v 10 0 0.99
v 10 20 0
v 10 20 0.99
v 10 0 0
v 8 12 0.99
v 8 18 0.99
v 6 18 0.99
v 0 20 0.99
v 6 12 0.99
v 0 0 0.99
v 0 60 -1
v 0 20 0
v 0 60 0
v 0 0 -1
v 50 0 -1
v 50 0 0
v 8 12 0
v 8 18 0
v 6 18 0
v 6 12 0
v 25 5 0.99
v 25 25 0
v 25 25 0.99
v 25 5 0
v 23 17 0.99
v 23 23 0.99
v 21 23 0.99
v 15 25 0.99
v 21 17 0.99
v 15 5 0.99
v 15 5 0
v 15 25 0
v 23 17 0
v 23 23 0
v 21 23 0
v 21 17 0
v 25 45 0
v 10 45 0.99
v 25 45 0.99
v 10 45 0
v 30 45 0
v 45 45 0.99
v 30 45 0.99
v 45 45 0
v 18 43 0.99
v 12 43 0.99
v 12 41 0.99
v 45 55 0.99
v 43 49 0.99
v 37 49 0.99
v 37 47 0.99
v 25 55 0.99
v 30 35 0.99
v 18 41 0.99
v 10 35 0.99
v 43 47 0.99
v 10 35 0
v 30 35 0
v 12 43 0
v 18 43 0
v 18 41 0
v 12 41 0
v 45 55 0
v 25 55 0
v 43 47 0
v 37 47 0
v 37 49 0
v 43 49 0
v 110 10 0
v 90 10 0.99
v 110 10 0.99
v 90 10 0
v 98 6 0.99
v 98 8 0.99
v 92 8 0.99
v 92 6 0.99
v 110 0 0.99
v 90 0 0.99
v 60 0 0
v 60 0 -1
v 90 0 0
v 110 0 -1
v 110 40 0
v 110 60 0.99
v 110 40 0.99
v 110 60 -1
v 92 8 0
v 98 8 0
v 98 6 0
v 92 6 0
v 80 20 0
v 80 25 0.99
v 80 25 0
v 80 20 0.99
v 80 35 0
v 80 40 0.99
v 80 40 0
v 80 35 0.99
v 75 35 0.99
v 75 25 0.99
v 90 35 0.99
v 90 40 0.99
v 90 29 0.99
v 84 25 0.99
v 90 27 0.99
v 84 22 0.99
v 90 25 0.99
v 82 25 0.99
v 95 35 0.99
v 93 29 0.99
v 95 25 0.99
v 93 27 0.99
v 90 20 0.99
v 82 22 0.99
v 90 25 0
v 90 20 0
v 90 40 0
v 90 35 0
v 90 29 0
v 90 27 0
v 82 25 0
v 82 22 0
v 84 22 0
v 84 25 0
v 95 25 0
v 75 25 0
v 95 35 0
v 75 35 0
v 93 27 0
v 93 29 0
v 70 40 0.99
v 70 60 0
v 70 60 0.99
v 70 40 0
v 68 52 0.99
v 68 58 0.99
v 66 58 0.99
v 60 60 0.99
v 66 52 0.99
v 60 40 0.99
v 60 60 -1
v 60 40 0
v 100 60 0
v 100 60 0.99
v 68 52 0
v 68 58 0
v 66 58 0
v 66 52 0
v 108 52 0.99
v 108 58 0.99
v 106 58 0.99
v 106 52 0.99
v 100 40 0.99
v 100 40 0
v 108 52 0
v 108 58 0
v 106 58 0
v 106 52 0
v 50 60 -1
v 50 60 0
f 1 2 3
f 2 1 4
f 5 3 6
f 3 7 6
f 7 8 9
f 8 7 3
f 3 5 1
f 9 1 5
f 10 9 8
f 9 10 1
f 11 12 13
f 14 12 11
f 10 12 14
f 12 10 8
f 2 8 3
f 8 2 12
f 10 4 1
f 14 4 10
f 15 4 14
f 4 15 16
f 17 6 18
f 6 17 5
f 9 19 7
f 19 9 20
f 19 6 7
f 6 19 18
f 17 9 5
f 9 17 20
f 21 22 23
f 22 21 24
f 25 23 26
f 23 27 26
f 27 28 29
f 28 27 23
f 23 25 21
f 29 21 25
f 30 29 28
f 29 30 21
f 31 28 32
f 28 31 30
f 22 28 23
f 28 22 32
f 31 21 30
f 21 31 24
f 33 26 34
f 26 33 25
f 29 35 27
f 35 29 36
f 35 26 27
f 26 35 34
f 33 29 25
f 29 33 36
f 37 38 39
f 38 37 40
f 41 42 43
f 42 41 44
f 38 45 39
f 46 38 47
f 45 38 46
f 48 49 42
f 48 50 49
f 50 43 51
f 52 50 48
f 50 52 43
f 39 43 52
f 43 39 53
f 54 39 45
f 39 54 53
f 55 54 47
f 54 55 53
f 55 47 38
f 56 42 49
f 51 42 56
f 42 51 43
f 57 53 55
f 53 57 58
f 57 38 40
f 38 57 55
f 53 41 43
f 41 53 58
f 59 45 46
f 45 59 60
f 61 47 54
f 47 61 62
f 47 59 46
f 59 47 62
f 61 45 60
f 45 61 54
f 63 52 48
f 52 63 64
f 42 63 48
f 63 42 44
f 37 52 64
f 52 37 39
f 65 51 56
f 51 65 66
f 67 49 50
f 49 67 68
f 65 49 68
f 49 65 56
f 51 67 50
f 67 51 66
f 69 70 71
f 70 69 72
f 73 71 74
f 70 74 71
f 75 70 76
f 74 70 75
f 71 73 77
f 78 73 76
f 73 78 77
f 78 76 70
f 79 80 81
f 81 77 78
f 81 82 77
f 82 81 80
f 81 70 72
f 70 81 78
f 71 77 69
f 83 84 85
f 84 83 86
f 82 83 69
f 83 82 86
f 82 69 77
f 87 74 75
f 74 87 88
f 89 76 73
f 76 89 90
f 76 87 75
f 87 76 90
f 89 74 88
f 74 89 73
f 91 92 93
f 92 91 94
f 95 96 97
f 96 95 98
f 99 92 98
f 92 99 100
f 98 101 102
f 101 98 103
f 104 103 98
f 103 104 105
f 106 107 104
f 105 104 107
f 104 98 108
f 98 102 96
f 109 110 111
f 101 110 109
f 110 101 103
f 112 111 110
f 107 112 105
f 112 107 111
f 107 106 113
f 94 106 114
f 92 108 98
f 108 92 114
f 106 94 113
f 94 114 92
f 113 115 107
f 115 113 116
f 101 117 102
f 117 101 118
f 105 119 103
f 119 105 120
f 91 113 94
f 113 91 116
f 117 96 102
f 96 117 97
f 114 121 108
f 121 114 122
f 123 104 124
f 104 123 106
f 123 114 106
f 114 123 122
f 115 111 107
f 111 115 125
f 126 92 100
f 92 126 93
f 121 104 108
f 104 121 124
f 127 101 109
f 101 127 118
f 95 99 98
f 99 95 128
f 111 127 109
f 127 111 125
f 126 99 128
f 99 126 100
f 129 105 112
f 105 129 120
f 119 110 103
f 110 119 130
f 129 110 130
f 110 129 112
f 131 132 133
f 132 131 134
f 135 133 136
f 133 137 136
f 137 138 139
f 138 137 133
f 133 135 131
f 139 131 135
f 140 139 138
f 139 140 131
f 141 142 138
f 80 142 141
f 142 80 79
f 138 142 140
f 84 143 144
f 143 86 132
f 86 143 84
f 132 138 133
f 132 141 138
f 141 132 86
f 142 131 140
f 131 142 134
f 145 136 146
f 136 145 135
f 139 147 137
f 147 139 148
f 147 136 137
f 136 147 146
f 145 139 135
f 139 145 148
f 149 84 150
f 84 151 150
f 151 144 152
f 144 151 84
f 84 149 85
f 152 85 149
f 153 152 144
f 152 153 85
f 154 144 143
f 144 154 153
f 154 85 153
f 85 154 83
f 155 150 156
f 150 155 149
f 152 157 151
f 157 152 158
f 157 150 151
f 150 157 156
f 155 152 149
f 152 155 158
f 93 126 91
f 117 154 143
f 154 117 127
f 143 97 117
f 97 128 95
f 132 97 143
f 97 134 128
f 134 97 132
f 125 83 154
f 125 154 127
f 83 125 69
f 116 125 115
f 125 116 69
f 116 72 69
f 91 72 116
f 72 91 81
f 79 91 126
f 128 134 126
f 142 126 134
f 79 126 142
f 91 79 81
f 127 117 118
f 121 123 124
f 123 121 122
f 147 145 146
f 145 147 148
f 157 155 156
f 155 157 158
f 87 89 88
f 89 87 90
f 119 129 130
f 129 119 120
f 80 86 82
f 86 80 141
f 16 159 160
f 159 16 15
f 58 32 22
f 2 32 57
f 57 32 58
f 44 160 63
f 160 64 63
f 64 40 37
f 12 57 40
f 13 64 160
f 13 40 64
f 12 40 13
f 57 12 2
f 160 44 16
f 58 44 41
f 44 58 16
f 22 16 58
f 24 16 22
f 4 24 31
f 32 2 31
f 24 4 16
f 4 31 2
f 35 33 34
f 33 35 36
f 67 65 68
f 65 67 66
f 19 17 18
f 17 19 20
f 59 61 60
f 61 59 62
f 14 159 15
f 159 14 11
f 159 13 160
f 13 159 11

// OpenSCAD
// file: ../../Base/Boxes.scad
// Fischertechnik Box Foundation
// Pre-designed Boxes

use <Constants.scad>

include <PlacementOptions.scad>

box190Width = 190;
box190Depth = 130;
box130Width = 130;
box130Depth = 95;
boxUsageHeight = 33.9;
boxWallThickness = 2.4;
boxBaseThickness = 1.0;

// getBoxWallThickness()
// Gets the wall thickness of a Fischertechnik Box

function getBoxWallThickness() = boxWallThickness;

// Gets the usable height of a fischertechnik box
function getBoxUsageHeight() = boxUsageHeight;

// Gets the thickness of the Fischertechnik box base.
function getBoxBaseThickness() = boxBaseThickness;

// Gets the usable inner space of a Box 190 as an x/y-list
function getBox190Space() = [
    box190Width - 2*getBoxWallThickness(), 
    box190Depth - 2*getBoxWallThickness() ];

// Imports the Fischertechnik empty box 130x190 mm and places it at position 0,0
// 190x130 are the outer sizes, the inner space is slightly smaller. Use getBox190Space() to get the inner sizes.
// This module needs the STL file "Fischertechnik Box 130x190.stl" in the library path.
// The box is positioned that the usable inner space is at the 0,0,0 position. The

module Box190() {
    translate([-getBoxWallThickness(),-getBoxWallThickness(),-getBoxBaseThickness()])
        import("Fischertechnik Box 130x190.stl", convexity=3);
}

// Gets the usable inner space of a Box 130 as an x/y-list
function getBox130Space() = [
    box130Width - 2*getBoxWallThickness(), 
    box130Depth - 2*getBoxWallThickness() ];

// Imports the Fischertechnik empty box 95x130 mm and places it at position 0,0
// 190x130 are the outer sizes, the inner space is slightly smaller. Use getBox190Space() to get the inner sizes.
// This module needs the STL file "Fischertechnik Box 95x130.stl" in the library path.
// The box is positioned that the usable inner space is at the 0,0,0 position. The

module Box130() {
    translate([-getBoxWallThickness(),-getBoxWallThickness(),-getBoxBaseThickness()])
        import("Fischertechnik Box 95x130.stl", convexity=3);
}

// Creates a web at the specified box walls
// corner 0 = LowerLeft, 1 = UpperLeft, 2 = UpperRight, 3 = LowerRight
// side 0 = LeftOfCorner, 1 = RightOfCorner
// distance = Distance in mm from the corner
// box = inner width and depth of the box (default: Box 190)
// webWidth = length of the web (default is 3 mms)
// webThickness = thickness of the web (default is 1 mm)

module BoxWeb(corner, side, distance, box=getBox190Space(), webWidth=3, webThickness=1.0) {
    sink = getBoxWallThickness()/2;

    width = (corner % 2 == 0) ? 
            (side == LeftOfCorner ? webWidth : webThickness) :
            (side == LeftOfCorner ? webThickness : webWidth);

    depth = (corner % 2 == 0) ? 
            (side == RightOfCorner ? webWidth : webThickness) :
            (side == RightOfCorner ? webThickness : webWidth);
    
    xDiff = corner == LowerLeft ? 
                (side == LeftOfCorner ? -sink : distance) :
            (corner == UpperLeft ?                
                (side == LeftOfCorner ? distance : -sink) :
            (corner == UpperRight ?
                (side == LeftOfCorner ? box.x-webWidth+sink : box.x-distance-webThickness) :
                (side == LeftOfCorner ? box.x-distance-webThickness: box.x-webWidth+sink)));

    yDiff = corner == LowerLeft ? 
                (side == RightOfCorner ? -sink : distance) :
            (corner == UpperLeft ?
                (side == RightOfCorner ? box.y-distance : box.y-webWidth+sink) :
            (corner == UpperRight ?
                (side == RightOfCorner ? box.y-webWidth+sink : box.y-distance) :
                (side == RightOfCorner ? distance : -sink)));
    
    translate([xDiff, yDiff, -getExcess()])
        cube([width, depth, boxUsageHeight + 2*getExcess()]);
}
// file: ../../Base/Rotation.scad
// Fischertechnik Box Foundation
// Geometry Helpers Rotation

include <PlacementOptions.scad>

// getRotatedSpace(space, rotation=NoRotation)
// Rotates the space dependent on the specified rotation

function getRotatedSpace(space, rotation=NoRotation) = [
    (rotation == Rotate90 || rotation == Rotate270) ? space.y : space.x,
    (rotation == Rotate90 || rotation == Rotate270) ? space.x : space.y
];

// Rotates the given space around the fixed left lower corner
// space = the space the children needs as width/depth list [width,depth]
// rotation = 0 Rotate0 degrees, 1 Rotate90 degrees, 2 Rotate180 degrees, 3 Rotate270 degrees (equivalent to -90)

module RotateFix(space, rotation=Rotate0) {
    dy = (rotation == Rotate0 || rotation == Rotate270) ? 0 :
        (rotation == Rotate90) ? space.x :
        space.y;
    dx = (rotation < Rotate180) ? 0 :
        (rotation == Rotate180) ? space.x :
        space.y;
    
    translate([dx, dy, 0])
        rotate([0, 0, rotations[rotation]])
            children();
}
// file: ../../Base/Alignment.scad
// Fischertechnik Box Foundation
// Geometry Helpers Alignment

include <PlacementOptions.scad>

// getAlignedX(elementWidth, spaceWidth, align=AlignRight, offset=0)
// Gets the aligned X offset of an element with the given
// width in the given space.
// elementWidth = The width of the element to positon
// spaceWidth = The space where the element should be aligned
// align = 0 AlignLeft, 1 AlignCenter, 2 AlignRight
// offset = an optional offset from the aligned position. When
// aligned left or centered, then positive values are in X direction.
// When aligned right then positive values are in negative X direction.

function getAlignedX(elementWidth, spaceWidth, align=AlignRight, offset=0) =
    (align == AlignLeft) ?
        offset :
        ((align == AlignCenter) ?
        (spaceWidth - elementWidth)/2 + offset :
        spaceWidth - offset - elementWidth);

// getAlignedY(elementDepth, spaceDepth, align=AlignTop, offset=0)
// Gets the aligned Y offset of an element with the given
// depth in the given space.
// elementDepth = The depth of the element to positon
// spaceDepth = The space where the element should be aligned
// align = 0 AlignBottom, 1 AlignCenter, 2 AlignTop
// offset = an optional offset from the aligned position. When
// aligned bottom or centered, then positive values are in Y direction.
// When aligned top then positive values are in negative Y direction.

function getAlignedY(elementDepth, spaceDepth, align=AlignTop, offset=0) =
    (align == AlignBottom) ?
        offset :
        ((align == AlignCenter) ?
        (spaceDepth - elementDepth)/2 + offset :
        spaceDepth - offset - elementDepth);
// file: ../../Base/Constants.scad
// Fischertechnik Box Foundation
// Constants

// Constant values necessary for multiple elements

// Base constants
dividerThickness = 1.2;
excess = 0.01;
fragments = 90;
tolerance = 0.8;

// Gets the thickness of a divider 
function getDividerThickness() = dividerThickness;

// Gets the excess that is used to merge walls into each other
function getExcess() = excess;

// Gets amount of fragments of a cylinder
function getFragments() = fragments;

// Gets the inner tolerance of a frame to each side
function getTolerance() = tolerance;


// Fischertechnik specific constants
axisDiameter = 4;
axisBottomDiameter = axisDiameter + 1;
standardEdgeDistance = 2.5;
standardWebDistance = 11.5;
standardCornerLength = 15;
tubeWallFactor = 1.6;

// Gets axis diameter
function getAxisDiameter() = axisDiameter;

// Gets axis bottom diameter for thicker part at the bottom
function getAxisBottomDiameter() = axisBottomDiameter;

// gets the standard distance to the wall of the box for dockable frames with webs
function getStandardEdgeDistance() = standardEdgeDistance;

// gets the standard distance of each web to the corner of the dockable frame
function getStandardWebDistance() = standardWebDistance;

// gets the standard length of the corner walls of a dockable frame
function getStandardCornerLength() = standardCornerLength;

// gets the wall thickness of a tube.
function getTubeWallThickness() = tubeWallFactor * getDividerThickness();
// file: ../TestHelper.scad
// Fischertechnik Box Foundation
// Test Helper

function getPlacementBaseSpace() = [50,60];
function getCubeSpace() = [10,20];

module PlacementBase() {
    color("green")
    translate([0, 0, -1])
        cube([getPlacementBaseSpace().x, getPlacementBaseSpace().y, 1]);
}

module Cube() {
    translate([0,0,-.01])
    difference() {
        cube([getCubeSpace().x,getCubeSpace().y,1]);
        translate([getCubeSpace().x*0.6, getCubeSpace().y*0.6, -1])
            cube([getCubeSpace().x*0.2,getCubeSpace().y*0.3,3]);
    }
}

module Deploy(distance=30) {
    for( i = [0:1:$children-1])
        translate([i*distance, 0])
            children(i);
}
// file: ../../Base/PlacementOptions.scad
// Fischertechnik Box Foundation
// Placement Options

// Alignment
NoAlign = 0;
AlignLeft = 1;
AlignBottom = 2;
AlignCenter = 3;
AlignRight = 4;
AlignTop = 5;

// Element rotation degree steps
rotations = [0, -90, -180, -270];

// Rotation
NoRotation = 0;
Rotate0 = 0;
Rotate90 = 1;
Rotate180 = 2;
Rotate270 = 3;

// Docking (seen from above)
NoDock = -1;
DockLeft = 0;
DockTop = 1;
DockRight = 2;
DockCorner = 2;
DockBottom = 3;

// Web corners
LowerLeft = 0;
UpperLeft = 1;
UpperRight = 2;
LowerRight = 3;

// Web position relative to corner
LeftOfCorner = 0;
RightOfCorner = 1;
// file: ../../Base/Placement.scad
// Fischertechnik Box Foundation
// Geometry Helpers Placement

use <Constants.scad>
use <Alignment.scad>
use <Rotation.scad>
use <Boxes.scad>

include <PlacementOptions.scad>

// Place(x=0, y=0, elementSpace=[0,0], alignX=AlignLeft, alignY=AlignBottom, rotation=Rotate0, boxSpace=getBox190Space())
// Places the child at the specified position
// y = Y-Position. This is a relative position when an X aligment is specified.
// x = X-Position. This is a relative position when an Y aligment is specified.
// elementSpace = space of the element to be placed [x,y]
// alignX = -1=NoAlign, 0 AlignLeft, 1 AlignCenter, 3 AlignRight (elementSpace and boxSpace required!)
// alignY = -1=NoAlign, 2 AlignBottom, 1 AlignCenter, 4 AlignTop (elementSpace and boxSpace required!)
// rotation = 0 Rotate0 0 degrees, 1 Rotate90 90 degrees, 
// 2 Rotate180 180 degrees, 3 Rotate270 270 degrees (equivalent to -90)
// boxSpace = Inner space of the box where the placement occurs [x,y] - default is Box 190x130 inner space

module Place(x=0, y=0, elementSpace=[0,0], 
  alignX=AlignLeft, alignY=AlignBottom, 
  rotation=NoRotation, boxSpace=getBox190Space()) {

    module Position(x, y, space, rotation=Rotate0) {
        translate([x, y, 0])
            RotateFix(space, rotation)
                children(0);
    }

    space = getRotatedSpace(elementSpace, rotation);
    alignedX = getAlignedX(space.x, boxSpace.x, alignX, x);
    alignedY = getAlignedY(space.y, boxSpace.y, alignY, y);
    Position(alignedX, alignedY, elementSpace, rotation)
        children(0);
}

// Center(space=getBox130Space(), elementSpace=[0,0])
// space = Space where the children is centered. For cylinder use centered=true and no elementSpace.
// elementSpace = space of the element to be centered [x,y]

module Center(space=getBox190Space(), elementSpace=[0,0]) {
    translate([(space.x - elementSpace.x) / 2, (space.y - elementSpace.y) / 2])
        children(0);
}

// CenterHorizontal(width=0, y=0, offset=0, space=getBox130Space())
// space = Space where the children is centered. For cylinder use centered=true and no elementSpace.
// elementSpace = space of the element to be centered [x,y]

module CenterHorizontal(width=0, y=0, offset=0, space=getBox190Space()) {
    translate([(space.x - width) / 2 + offset, y])
        children(0);
}

// CenterVertical(depth=0, x=0, offset=0, space=getBox130Space())
// space = Space where the children is centered. For cylinder use centered=true and no elementSpace.
// elementSpace = space of the element to be centered [x,y]

module CenterVerticalal(depth=0, x=0, offset=0, space=getBox190Space()) {
    translate([x, (space.y - depth) / 2 + offset])
        children(0);
}
// main file
// Fischertechnik Box Foundation
// Geometry Helpers Placement
// Test Place

use <../../Base/Placement.scad>

include <../../Base/PlacementOptions.scad>

use <../TestHelper.scad>

PlacementBase();

Place()
    Cube();

Place(15, 5)
    Cube();

Place(10, 35, elementSpace=getCubeSpace(), rotation=Rotate270)
    Cube();

Place(5, 5, 
    elementSpace=getCubeSpace(), 
    alignX=AlignRight, 
    alignY=AlignTop, 
    rotation=Rotate90, 
    boxSpace=getPlacementBaseSpace())
    Cube();


translate([60, 0]) {
    PlacementBase();
    
    Place(
        elementSpace=getCubeSpace(), 
        rotation=Rotate270, 
        alignX=AlignRight, 
        boxSpace=getPlacementBaseSpace())
        Cube();

    Place(
        elementSpace=getCubeSpace(), 
        rotation=Rotate180, 
        alignX=AlignCenter, 
        alignY=AlignCenter, 
        boxSpace=getPlacementBaseSpace())
        Cube();

    Place(
        elementSpace=getCubeSpace(), 
        rotation=Rotate90, 
        alignX=AlignCenter, 
        alignY=AlignCenter, 
        boxSpace=getPlacementBaseSpace())
        Cube();
    
    Place(elementSpace=getCubeSpace(), alignY=AlignTop, boxSpace=getPlacementBaseSpace())
        Cube();
    
    Place(elementSpace=getCubeSpace(), alignX=AlignRight, alignY=AlignTop, boxSpace=getPlacementBaseSpace())
        Cube();
}
